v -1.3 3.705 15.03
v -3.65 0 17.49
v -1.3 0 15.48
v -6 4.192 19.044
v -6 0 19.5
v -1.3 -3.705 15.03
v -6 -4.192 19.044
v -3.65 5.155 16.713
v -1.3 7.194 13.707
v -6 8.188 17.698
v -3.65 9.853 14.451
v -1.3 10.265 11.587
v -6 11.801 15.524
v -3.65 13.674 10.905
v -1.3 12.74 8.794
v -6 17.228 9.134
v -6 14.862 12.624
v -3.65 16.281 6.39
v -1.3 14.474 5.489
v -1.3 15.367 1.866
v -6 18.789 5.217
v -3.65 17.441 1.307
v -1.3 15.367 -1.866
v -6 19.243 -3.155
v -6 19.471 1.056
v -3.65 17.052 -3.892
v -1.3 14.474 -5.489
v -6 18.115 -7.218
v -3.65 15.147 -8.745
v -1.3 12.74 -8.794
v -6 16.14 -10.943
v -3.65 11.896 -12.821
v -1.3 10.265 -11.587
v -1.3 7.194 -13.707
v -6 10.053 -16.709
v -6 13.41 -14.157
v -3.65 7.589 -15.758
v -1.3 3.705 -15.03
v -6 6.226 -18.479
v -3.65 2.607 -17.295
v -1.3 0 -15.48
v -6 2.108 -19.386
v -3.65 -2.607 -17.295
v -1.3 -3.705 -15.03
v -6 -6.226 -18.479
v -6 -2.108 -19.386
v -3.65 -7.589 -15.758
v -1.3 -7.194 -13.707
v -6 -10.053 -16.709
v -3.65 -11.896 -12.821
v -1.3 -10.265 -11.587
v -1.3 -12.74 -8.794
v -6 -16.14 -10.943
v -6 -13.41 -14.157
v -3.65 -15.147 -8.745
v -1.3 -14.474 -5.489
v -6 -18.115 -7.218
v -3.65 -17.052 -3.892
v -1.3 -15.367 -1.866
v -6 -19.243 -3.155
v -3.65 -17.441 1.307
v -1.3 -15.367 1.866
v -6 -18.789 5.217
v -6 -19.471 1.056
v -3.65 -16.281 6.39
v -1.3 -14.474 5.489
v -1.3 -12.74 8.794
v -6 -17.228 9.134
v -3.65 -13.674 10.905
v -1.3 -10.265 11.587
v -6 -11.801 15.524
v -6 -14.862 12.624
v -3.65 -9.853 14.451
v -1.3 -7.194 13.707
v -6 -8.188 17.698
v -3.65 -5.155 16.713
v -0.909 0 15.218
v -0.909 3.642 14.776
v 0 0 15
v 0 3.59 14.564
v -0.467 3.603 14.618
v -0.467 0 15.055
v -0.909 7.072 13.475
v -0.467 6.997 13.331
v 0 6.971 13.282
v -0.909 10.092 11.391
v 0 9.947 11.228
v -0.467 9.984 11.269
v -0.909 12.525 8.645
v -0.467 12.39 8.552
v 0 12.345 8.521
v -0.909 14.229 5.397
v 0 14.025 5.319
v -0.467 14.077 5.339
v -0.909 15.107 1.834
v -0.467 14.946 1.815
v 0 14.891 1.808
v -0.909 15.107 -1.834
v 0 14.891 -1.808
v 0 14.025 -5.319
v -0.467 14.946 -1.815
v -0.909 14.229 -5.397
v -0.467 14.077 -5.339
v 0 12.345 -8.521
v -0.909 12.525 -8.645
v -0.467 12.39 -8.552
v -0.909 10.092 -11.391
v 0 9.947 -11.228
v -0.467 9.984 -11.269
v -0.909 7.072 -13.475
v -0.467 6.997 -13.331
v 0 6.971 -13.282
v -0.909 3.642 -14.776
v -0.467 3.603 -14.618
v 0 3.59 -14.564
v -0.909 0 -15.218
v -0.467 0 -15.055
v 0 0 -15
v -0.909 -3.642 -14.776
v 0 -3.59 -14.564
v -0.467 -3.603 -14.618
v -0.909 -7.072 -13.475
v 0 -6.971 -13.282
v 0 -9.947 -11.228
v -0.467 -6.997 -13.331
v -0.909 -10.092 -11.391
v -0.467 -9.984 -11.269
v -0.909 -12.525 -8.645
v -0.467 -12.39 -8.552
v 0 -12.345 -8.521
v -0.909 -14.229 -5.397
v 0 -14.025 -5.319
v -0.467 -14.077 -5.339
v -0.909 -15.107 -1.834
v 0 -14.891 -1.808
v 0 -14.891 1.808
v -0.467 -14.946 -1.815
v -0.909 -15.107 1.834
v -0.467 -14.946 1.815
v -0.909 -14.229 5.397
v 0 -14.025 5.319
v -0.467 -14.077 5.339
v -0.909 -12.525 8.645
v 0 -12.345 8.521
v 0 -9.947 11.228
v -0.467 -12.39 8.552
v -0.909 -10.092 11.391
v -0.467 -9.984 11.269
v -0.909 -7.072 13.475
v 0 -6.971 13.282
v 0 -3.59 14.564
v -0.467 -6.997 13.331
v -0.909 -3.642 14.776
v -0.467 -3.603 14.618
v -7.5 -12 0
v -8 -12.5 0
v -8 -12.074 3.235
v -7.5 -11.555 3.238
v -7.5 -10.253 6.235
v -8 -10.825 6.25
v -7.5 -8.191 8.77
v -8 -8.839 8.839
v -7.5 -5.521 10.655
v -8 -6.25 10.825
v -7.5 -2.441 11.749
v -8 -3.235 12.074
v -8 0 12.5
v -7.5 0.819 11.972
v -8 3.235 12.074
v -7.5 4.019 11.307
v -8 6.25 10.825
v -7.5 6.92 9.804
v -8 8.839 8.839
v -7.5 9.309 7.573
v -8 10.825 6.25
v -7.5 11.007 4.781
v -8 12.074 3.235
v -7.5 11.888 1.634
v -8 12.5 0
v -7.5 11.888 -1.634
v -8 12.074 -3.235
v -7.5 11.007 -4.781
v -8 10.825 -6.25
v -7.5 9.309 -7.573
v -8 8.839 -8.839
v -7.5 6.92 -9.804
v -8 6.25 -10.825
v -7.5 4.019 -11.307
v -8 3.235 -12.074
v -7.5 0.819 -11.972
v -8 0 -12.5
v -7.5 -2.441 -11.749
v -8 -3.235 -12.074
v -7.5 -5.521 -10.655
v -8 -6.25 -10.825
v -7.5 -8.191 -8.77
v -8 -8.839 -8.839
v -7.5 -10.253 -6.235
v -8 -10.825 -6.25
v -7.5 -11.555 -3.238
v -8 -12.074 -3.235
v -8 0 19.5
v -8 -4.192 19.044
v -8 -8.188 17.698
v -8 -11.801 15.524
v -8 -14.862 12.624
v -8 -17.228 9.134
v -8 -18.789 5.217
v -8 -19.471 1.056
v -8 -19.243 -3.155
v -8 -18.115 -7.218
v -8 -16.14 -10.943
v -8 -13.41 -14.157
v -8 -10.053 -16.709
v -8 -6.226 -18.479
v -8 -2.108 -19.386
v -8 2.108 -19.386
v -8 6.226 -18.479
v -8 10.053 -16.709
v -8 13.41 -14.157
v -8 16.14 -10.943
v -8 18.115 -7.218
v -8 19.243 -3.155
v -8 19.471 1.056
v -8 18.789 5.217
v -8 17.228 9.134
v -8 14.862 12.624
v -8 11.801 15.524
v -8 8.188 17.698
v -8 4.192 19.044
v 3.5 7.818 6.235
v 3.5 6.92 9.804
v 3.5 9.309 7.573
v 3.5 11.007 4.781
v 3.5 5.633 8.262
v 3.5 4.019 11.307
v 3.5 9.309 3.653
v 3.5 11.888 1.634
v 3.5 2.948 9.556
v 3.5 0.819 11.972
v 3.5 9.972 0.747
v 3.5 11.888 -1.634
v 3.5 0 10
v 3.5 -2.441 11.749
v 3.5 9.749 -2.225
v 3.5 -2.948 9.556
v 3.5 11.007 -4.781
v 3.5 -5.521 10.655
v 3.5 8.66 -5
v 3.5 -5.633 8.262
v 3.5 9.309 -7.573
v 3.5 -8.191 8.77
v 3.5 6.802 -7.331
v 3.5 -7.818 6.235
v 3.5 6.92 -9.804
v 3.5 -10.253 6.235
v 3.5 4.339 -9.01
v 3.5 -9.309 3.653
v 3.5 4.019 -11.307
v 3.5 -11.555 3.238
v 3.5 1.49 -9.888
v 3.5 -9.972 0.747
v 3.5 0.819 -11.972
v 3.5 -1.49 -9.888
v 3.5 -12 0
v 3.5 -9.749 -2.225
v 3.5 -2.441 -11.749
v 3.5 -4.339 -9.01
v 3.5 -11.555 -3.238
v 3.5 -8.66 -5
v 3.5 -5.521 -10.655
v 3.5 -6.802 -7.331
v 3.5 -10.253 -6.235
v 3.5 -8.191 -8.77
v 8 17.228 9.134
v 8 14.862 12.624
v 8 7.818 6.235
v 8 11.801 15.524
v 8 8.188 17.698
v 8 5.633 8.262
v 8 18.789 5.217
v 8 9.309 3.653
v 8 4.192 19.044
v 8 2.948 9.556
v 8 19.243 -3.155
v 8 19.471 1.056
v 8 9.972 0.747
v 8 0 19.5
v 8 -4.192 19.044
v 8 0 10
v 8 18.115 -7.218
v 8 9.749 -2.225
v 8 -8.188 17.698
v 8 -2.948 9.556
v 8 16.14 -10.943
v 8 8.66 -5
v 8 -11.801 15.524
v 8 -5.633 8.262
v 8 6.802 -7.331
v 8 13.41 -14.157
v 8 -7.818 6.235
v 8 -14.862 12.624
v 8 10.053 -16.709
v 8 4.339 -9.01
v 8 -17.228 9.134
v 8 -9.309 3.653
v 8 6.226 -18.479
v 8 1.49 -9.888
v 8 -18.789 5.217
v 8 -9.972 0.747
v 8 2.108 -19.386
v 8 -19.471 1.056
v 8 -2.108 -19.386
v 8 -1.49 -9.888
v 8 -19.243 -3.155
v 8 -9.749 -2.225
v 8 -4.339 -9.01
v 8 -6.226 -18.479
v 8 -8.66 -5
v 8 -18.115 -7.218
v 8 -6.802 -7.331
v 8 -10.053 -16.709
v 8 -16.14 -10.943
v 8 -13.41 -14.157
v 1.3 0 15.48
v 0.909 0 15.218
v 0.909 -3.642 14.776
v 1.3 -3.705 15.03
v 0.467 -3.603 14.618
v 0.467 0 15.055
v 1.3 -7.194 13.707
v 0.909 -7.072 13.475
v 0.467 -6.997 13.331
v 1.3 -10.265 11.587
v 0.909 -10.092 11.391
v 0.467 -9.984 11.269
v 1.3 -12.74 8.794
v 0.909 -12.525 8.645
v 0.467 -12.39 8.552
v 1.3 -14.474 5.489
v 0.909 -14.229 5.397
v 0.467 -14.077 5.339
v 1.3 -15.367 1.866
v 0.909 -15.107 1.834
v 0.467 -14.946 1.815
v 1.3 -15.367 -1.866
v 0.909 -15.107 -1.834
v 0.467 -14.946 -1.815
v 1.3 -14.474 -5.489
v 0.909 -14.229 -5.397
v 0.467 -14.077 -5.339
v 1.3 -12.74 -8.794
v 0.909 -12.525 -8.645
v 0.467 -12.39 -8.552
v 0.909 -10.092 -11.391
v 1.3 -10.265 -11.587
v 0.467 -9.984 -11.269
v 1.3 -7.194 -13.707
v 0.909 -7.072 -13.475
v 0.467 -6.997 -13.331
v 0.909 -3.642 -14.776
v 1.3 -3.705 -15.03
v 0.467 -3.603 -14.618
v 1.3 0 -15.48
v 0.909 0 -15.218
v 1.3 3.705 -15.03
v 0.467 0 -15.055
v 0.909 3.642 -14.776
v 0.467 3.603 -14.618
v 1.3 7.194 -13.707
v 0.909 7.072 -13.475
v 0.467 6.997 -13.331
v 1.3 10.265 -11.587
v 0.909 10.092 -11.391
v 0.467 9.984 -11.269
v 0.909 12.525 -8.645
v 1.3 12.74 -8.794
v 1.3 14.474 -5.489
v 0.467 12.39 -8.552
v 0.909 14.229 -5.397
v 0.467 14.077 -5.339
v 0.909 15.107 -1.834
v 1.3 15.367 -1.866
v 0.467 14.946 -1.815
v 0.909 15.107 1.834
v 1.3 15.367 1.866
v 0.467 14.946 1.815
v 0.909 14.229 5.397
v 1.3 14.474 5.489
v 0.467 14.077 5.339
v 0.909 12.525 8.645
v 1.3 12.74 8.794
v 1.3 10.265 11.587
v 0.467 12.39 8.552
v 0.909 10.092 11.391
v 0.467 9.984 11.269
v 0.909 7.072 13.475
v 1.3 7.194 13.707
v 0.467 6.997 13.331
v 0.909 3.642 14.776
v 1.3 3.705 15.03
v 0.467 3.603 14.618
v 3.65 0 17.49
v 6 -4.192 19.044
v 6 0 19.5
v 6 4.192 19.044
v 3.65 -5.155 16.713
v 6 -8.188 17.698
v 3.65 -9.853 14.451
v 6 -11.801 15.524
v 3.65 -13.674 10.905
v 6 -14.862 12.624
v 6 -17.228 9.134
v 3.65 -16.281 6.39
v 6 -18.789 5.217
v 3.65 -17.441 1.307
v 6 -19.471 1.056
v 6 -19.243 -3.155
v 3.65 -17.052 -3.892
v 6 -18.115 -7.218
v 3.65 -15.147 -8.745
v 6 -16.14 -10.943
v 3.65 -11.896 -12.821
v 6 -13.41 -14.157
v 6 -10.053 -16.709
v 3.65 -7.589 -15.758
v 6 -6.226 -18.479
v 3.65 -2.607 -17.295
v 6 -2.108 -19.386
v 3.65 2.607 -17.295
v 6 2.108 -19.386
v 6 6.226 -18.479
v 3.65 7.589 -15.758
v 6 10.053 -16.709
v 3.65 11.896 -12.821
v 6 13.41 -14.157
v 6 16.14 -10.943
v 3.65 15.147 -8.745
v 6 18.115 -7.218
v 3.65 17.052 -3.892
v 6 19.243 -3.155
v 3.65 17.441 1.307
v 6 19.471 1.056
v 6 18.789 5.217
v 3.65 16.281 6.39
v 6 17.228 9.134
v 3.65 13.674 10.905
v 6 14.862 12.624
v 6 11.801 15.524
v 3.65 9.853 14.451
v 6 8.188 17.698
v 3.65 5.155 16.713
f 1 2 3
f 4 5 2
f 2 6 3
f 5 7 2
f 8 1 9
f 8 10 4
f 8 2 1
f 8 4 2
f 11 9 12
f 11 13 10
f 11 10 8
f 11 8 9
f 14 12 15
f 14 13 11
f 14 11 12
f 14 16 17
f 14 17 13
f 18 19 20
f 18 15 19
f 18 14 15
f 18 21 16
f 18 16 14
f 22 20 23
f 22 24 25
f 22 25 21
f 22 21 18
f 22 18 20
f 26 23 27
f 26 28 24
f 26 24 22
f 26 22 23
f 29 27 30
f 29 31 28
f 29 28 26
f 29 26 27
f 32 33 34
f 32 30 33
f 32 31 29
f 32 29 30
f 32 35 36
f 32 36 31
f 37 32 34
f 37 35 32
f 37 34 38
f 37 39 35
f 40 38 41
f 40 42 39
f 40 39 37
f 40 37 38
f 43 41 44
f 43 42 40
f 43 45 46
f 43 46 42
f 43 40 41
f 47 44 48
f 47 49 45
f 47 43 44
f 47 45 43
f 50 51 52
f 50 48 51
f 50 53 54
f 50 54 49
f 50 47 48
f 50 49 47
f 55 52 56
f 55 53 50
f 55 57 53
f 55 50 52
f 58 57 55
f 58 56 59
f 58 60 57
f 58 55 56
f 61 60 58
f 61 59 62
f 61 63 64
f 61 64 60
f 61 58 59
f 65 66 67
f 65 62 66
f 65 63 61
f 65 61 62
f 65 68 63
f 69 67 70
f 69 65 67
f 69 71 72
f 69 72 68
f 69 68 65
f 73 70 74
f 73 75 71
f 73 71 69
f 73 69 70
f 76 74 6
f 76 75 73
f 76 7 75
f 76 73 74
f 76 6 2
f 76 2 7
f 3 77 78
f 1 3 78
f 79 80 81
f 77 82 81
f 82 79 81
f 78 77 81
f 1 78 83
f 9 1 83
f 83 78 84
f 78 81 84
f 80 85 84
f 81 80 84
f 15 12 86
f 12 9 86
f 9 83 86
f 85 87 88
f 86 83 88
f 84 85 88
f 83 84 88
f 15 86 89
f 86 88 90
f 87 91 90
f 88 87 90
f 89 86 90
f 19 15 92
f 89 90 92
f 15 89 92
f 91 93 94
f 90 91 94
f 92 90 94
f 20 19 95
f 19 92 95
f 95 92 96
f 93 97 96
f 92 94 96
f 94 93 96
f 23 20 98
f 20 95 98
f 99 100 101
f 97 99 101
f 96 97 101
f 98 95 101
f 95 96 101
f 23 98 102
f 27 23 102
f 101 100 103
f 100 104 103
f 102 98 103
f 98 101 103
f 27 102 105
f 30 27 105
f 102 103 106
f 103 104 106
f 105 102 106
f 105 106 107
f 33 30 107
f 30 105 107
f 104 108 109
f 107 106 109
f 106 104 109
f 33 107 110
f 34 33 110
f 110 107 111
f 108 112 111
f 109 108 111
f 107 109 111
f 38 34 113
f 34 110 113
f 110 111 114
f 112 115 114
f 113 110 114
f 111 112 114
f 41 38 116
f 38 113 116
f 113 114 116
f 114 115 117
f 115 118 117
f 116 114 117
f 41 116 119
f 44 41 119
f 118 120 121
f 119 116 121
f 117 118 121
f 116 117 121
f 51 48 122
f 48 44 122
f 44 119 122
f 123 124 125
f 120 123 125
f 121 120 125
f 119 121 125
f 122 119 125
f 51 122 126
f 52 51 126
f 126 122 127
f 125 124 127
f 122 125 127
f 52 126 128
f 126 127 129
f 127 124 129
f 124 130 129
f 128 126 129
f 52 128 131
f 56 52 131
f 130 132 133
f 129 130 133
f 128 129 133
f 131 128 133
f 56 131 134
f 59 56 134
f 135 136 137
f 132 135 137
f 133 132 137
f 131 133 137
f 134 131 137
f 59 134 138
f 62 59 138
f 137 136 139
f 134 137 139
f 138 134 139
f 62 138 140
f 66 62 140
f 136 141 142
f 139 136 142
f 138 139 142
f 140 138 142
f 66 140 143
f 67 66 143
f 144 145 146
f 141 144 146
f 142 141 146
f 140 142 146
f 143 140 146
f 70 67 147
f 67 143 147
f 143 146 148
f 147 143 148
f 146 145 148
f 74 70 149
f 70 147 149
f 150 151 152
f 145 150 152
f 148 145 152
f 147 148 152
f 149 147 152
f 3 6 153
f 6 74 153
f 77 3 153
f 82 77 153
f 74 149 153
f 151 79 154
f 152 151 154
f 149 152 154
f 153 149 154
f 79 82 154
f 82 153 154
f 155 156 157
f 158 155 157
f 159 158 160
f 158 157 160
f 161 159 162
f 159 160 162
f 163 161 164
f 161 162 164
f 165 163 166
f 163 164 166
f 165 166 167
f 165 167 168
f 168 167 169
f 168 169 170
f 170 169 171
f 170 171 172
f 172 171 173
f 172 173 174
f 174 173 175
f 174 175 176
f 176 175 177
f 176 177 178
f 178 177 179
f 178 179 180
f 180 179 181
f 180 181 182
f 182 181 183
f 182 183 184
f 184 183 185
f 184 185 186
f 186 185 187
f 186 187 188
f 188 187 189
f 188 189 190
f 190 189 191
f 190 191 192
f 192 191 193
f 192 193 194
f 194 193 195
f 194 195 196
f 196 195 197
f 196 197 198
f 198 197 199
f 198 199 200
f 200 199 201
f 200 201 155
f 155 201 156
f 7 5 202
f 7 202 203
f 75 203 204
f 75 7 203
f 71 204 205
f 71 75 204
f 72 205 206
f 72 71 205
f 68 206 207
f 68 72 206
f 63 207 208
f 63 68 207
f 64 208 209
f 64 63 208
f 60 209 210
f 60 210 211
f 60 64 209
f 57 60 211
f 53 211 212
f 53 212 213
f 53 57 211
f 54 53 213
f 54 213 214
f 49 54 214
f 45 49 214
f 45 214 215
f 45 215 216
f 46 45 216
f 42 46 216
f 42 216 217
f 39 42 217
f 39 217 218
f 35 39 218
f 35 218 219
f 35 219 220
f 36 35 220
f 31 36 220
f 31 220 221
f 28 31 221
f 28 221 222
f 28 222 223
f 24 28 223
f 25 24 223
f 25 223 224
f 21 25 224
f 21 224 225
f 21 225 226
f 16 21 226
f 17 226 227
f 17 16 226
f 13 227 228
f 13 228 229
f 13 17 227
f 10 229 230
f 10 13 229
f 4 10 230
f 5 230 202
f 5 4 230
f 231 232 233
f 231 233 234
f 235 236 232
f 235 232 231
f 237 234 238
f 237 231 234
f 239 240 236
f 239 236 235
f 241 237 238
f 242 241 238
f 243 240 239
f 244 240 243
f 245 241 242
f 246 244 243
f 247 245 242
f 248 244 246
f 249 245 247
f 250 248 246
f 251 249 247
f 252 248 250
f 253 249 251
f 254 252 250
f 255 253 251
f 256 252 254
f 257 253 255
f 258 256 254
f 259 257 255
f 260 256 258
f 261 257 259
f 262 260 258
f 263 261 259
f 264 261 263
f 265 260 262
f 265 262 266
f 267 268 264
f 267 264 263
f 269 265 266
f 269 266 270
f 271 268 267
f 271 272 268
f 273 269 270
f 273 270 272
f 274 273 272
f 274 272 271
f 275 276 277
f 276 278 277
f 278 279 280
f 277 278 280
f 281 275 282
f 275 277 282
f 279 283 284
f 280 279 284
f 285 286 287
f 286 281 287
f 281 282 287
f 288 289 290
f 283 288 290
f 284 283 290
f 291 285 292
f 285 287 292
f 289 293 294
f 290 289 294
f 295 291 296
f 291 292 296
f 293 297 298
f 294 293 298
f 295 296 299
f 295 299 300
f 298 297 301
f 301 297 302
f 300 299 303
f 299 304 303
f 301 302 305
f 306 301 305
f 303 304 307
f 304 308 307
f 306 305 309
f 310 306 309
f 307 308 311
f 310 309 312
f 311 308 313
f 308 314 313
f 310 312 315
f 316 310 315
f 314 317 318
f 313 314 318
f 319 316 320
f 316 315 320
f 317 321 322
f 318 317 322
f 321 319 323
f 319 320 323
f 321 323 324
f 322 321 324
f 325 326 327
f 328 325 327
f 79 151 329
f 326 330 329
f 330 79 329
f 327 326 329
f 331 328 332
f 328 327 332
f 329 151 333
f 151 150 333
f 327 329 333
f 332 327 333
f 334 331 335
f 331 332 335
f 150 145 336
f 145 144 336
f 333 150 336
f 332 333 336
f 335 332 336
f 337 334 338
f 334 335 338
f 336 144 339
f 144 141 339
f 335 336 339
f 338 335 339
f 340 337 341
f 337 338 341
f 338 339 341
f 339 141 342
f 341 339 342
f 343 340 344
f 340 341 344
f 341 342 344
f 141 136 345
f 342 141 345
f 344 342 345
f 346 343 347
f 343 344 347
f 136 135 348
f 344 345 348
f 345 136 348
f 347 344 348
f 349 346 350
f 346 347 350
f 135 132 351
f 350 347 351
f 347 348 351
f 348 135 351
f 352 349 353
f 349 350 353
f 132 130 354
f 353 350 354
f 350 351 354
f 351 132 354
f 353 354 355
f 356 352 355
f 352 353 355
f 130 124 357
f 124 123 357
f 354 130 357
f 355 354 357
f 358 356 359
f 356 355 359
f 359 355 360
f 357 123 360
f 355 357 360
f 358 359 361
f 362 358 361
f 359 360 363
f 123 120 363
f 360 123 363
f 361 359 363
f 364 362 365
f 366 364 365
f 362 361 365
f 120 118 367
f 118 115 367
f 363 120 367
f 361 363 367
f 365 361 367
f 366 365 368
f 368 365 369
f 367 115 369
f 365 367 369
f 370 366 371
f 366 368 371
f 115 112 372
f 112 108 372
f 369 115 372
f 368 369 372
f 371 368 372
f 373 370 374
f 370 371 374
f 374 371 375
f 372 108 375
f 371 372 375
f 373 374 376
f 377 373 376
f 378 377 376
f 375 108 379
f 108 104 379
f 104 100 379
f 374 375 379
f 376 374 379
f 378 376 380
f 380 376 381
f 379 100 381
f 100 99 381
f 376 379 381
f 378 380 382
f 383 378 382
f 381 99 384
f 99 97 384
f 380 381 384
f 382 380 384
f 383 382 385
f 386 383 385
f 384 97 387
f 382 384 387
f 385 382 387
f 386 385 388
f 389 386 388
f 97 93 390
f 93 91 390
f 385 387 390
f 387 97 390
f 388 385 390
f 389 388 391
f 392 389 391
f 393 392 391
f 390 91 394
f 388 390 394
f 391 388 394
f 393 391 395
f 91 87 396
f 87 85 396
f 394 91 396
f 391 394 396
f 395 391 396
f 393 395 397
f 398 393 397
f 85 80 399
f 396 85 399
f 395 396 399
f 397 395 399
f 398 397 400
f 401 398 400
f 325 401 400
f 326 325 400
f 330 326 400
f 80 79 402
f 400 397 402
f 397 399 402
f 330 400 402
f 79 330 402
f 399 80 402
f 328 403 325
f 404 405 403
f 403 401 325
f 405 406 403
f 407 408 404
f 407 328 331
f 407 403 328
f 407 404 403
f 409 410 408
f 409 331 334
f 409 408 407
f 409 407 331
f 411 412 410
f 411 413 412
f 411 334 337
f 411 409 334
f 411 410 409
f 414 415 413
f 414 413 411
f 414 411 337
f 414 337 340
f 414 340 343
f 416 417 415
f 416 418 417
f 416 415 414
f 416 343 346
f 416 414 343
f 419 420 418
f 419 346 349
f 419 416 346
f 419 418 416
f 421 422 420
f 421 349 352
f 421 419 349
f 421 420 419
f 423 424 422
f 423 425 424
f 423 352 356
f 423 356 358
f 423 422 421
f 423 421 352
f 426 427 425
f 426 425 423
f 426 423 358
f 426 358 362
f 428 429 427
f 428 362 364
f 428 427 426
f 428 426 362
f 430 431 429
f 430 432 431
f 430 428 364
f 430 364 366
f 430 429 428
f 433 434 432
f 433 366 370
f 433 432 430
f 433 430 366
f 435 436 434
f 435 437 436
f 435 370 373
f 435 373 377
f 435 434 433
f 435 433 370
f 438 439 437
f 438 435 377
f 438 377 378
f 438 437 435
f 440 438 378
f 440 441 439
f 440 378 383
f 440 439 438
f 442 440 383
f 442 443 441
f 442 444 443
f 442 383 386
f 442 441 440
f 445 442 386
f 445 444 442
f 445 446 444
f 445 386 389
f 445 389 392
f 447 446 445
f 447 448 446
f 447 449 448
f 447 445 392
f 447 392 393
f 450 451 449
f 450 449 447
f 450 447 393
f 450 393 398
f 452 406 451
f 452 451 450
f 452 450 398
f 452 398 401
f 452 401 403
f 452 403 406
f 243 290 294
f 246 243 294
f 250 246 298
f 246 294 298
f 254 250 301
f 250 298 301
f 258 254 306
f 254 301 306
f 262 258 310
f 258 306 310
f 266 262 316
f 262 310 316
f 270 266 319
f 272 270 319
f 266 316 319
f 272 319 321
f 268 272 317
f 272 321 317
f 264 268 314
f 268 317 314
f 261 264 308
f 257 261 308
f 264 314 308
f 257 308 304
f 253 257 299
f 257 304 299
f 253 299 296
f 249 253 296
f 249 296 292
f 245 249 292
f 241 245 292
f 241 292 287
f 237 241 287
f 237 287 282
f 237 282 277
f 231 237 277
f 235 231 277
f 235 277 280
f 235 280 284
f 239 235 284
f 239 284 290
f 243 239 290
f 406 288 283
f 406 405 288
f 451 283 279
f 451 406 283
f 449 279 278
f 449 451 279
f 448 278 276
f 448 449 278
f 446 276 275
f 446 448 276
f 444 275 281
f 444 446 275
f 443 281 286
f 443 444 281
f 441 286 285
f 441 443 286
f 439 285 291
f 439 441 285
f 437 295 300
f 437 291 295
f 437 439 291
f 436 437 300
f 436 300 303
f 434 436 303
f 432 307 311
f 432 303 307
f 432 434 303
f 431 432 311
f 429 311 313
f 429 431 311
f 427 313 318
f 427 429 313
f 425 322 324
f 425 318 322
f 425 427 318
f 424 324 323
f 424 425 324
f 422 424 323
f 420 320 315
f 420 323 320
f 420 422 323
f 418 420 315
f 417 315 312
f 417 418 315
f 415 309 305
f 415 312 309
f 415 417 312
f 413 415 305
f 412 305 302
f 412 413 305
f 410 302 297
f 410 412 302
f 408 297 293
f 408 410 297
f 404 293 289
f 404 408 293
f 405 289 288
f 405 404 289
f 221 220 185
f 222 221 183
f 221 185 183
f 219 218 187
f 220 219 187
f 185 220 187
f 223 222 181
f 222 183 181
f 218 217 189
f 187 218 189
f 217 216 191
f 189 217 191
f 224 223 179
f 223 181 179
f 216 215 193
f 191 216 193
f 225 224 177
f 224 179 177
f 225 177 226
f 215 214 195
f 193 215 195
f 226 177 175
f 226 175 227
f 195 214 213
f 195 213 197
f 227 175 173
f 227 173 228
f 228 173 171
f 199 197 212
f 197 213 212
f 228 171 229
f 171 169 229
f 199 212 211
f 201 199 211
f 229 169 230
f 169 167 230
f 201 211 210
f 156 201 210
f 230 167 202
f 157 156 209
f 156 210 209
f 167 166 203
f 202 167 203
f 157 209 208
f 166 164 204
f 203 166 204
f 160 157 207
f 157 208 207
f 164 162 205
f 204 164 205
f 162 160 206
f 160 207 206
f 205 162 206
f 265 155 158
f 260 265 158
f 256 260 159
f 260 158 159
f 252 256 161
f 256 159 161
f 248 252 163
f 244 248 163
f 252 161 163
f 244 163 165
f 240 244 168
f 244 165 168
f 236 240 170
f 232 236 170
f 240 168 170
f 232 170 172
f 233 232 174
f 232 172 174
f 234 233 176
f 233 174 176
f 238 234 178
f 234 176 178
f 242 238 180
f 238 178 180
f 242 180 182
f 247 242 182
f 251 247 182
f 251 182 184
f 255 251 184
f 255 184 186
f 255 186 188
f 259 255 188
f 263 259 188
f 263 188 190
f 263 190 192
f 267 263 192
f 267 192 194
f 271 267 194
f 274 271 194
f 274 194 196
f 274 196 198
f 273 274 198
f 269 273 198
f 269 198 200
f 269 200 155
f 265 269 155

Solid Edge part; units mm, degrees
sketch "Sketch1" plane through (0, 0, 0) normal (0, -1, 0) x (1, 0, 0)
  line L0 (-8, 10) -> (-8, 19.5)
  line L1 (-8, 19.5) -> (-6, 19.5)
  line L2 (-6, 19.5) -> (-1.3, 15.4801)
  arc A0 (-1.3, 15.4801) -> (0, 15) centre (0, 17) ccw
  line L3 (0, 15) -> (0, 10)
  line L4 (0, 10) -> (-8, 10)
revolve "RevolvedProtrusion1" add sketch "Sketch1" angle 360 about axis through (-60, 0, 0) along (1, 0, 0)
mirror "Mirror1" about plane through (0, 0, 0) normal (1, 0, 0) of "RevolvedProtrusion1"
sketch "Sketch2" plane through (-8, 0, 0) normal (-1, 0, 0) x (0, -1, 0)
  circle A0 centre (0, 0) radius 12
extrude "Cutout1" cut sketch "Sketch2" against normal blind 11.5
chamfer "Fase_1" distance 0.5 angle 45 1 edges at (-8, 12, 0)
properties material "Aluminium, 1060"
